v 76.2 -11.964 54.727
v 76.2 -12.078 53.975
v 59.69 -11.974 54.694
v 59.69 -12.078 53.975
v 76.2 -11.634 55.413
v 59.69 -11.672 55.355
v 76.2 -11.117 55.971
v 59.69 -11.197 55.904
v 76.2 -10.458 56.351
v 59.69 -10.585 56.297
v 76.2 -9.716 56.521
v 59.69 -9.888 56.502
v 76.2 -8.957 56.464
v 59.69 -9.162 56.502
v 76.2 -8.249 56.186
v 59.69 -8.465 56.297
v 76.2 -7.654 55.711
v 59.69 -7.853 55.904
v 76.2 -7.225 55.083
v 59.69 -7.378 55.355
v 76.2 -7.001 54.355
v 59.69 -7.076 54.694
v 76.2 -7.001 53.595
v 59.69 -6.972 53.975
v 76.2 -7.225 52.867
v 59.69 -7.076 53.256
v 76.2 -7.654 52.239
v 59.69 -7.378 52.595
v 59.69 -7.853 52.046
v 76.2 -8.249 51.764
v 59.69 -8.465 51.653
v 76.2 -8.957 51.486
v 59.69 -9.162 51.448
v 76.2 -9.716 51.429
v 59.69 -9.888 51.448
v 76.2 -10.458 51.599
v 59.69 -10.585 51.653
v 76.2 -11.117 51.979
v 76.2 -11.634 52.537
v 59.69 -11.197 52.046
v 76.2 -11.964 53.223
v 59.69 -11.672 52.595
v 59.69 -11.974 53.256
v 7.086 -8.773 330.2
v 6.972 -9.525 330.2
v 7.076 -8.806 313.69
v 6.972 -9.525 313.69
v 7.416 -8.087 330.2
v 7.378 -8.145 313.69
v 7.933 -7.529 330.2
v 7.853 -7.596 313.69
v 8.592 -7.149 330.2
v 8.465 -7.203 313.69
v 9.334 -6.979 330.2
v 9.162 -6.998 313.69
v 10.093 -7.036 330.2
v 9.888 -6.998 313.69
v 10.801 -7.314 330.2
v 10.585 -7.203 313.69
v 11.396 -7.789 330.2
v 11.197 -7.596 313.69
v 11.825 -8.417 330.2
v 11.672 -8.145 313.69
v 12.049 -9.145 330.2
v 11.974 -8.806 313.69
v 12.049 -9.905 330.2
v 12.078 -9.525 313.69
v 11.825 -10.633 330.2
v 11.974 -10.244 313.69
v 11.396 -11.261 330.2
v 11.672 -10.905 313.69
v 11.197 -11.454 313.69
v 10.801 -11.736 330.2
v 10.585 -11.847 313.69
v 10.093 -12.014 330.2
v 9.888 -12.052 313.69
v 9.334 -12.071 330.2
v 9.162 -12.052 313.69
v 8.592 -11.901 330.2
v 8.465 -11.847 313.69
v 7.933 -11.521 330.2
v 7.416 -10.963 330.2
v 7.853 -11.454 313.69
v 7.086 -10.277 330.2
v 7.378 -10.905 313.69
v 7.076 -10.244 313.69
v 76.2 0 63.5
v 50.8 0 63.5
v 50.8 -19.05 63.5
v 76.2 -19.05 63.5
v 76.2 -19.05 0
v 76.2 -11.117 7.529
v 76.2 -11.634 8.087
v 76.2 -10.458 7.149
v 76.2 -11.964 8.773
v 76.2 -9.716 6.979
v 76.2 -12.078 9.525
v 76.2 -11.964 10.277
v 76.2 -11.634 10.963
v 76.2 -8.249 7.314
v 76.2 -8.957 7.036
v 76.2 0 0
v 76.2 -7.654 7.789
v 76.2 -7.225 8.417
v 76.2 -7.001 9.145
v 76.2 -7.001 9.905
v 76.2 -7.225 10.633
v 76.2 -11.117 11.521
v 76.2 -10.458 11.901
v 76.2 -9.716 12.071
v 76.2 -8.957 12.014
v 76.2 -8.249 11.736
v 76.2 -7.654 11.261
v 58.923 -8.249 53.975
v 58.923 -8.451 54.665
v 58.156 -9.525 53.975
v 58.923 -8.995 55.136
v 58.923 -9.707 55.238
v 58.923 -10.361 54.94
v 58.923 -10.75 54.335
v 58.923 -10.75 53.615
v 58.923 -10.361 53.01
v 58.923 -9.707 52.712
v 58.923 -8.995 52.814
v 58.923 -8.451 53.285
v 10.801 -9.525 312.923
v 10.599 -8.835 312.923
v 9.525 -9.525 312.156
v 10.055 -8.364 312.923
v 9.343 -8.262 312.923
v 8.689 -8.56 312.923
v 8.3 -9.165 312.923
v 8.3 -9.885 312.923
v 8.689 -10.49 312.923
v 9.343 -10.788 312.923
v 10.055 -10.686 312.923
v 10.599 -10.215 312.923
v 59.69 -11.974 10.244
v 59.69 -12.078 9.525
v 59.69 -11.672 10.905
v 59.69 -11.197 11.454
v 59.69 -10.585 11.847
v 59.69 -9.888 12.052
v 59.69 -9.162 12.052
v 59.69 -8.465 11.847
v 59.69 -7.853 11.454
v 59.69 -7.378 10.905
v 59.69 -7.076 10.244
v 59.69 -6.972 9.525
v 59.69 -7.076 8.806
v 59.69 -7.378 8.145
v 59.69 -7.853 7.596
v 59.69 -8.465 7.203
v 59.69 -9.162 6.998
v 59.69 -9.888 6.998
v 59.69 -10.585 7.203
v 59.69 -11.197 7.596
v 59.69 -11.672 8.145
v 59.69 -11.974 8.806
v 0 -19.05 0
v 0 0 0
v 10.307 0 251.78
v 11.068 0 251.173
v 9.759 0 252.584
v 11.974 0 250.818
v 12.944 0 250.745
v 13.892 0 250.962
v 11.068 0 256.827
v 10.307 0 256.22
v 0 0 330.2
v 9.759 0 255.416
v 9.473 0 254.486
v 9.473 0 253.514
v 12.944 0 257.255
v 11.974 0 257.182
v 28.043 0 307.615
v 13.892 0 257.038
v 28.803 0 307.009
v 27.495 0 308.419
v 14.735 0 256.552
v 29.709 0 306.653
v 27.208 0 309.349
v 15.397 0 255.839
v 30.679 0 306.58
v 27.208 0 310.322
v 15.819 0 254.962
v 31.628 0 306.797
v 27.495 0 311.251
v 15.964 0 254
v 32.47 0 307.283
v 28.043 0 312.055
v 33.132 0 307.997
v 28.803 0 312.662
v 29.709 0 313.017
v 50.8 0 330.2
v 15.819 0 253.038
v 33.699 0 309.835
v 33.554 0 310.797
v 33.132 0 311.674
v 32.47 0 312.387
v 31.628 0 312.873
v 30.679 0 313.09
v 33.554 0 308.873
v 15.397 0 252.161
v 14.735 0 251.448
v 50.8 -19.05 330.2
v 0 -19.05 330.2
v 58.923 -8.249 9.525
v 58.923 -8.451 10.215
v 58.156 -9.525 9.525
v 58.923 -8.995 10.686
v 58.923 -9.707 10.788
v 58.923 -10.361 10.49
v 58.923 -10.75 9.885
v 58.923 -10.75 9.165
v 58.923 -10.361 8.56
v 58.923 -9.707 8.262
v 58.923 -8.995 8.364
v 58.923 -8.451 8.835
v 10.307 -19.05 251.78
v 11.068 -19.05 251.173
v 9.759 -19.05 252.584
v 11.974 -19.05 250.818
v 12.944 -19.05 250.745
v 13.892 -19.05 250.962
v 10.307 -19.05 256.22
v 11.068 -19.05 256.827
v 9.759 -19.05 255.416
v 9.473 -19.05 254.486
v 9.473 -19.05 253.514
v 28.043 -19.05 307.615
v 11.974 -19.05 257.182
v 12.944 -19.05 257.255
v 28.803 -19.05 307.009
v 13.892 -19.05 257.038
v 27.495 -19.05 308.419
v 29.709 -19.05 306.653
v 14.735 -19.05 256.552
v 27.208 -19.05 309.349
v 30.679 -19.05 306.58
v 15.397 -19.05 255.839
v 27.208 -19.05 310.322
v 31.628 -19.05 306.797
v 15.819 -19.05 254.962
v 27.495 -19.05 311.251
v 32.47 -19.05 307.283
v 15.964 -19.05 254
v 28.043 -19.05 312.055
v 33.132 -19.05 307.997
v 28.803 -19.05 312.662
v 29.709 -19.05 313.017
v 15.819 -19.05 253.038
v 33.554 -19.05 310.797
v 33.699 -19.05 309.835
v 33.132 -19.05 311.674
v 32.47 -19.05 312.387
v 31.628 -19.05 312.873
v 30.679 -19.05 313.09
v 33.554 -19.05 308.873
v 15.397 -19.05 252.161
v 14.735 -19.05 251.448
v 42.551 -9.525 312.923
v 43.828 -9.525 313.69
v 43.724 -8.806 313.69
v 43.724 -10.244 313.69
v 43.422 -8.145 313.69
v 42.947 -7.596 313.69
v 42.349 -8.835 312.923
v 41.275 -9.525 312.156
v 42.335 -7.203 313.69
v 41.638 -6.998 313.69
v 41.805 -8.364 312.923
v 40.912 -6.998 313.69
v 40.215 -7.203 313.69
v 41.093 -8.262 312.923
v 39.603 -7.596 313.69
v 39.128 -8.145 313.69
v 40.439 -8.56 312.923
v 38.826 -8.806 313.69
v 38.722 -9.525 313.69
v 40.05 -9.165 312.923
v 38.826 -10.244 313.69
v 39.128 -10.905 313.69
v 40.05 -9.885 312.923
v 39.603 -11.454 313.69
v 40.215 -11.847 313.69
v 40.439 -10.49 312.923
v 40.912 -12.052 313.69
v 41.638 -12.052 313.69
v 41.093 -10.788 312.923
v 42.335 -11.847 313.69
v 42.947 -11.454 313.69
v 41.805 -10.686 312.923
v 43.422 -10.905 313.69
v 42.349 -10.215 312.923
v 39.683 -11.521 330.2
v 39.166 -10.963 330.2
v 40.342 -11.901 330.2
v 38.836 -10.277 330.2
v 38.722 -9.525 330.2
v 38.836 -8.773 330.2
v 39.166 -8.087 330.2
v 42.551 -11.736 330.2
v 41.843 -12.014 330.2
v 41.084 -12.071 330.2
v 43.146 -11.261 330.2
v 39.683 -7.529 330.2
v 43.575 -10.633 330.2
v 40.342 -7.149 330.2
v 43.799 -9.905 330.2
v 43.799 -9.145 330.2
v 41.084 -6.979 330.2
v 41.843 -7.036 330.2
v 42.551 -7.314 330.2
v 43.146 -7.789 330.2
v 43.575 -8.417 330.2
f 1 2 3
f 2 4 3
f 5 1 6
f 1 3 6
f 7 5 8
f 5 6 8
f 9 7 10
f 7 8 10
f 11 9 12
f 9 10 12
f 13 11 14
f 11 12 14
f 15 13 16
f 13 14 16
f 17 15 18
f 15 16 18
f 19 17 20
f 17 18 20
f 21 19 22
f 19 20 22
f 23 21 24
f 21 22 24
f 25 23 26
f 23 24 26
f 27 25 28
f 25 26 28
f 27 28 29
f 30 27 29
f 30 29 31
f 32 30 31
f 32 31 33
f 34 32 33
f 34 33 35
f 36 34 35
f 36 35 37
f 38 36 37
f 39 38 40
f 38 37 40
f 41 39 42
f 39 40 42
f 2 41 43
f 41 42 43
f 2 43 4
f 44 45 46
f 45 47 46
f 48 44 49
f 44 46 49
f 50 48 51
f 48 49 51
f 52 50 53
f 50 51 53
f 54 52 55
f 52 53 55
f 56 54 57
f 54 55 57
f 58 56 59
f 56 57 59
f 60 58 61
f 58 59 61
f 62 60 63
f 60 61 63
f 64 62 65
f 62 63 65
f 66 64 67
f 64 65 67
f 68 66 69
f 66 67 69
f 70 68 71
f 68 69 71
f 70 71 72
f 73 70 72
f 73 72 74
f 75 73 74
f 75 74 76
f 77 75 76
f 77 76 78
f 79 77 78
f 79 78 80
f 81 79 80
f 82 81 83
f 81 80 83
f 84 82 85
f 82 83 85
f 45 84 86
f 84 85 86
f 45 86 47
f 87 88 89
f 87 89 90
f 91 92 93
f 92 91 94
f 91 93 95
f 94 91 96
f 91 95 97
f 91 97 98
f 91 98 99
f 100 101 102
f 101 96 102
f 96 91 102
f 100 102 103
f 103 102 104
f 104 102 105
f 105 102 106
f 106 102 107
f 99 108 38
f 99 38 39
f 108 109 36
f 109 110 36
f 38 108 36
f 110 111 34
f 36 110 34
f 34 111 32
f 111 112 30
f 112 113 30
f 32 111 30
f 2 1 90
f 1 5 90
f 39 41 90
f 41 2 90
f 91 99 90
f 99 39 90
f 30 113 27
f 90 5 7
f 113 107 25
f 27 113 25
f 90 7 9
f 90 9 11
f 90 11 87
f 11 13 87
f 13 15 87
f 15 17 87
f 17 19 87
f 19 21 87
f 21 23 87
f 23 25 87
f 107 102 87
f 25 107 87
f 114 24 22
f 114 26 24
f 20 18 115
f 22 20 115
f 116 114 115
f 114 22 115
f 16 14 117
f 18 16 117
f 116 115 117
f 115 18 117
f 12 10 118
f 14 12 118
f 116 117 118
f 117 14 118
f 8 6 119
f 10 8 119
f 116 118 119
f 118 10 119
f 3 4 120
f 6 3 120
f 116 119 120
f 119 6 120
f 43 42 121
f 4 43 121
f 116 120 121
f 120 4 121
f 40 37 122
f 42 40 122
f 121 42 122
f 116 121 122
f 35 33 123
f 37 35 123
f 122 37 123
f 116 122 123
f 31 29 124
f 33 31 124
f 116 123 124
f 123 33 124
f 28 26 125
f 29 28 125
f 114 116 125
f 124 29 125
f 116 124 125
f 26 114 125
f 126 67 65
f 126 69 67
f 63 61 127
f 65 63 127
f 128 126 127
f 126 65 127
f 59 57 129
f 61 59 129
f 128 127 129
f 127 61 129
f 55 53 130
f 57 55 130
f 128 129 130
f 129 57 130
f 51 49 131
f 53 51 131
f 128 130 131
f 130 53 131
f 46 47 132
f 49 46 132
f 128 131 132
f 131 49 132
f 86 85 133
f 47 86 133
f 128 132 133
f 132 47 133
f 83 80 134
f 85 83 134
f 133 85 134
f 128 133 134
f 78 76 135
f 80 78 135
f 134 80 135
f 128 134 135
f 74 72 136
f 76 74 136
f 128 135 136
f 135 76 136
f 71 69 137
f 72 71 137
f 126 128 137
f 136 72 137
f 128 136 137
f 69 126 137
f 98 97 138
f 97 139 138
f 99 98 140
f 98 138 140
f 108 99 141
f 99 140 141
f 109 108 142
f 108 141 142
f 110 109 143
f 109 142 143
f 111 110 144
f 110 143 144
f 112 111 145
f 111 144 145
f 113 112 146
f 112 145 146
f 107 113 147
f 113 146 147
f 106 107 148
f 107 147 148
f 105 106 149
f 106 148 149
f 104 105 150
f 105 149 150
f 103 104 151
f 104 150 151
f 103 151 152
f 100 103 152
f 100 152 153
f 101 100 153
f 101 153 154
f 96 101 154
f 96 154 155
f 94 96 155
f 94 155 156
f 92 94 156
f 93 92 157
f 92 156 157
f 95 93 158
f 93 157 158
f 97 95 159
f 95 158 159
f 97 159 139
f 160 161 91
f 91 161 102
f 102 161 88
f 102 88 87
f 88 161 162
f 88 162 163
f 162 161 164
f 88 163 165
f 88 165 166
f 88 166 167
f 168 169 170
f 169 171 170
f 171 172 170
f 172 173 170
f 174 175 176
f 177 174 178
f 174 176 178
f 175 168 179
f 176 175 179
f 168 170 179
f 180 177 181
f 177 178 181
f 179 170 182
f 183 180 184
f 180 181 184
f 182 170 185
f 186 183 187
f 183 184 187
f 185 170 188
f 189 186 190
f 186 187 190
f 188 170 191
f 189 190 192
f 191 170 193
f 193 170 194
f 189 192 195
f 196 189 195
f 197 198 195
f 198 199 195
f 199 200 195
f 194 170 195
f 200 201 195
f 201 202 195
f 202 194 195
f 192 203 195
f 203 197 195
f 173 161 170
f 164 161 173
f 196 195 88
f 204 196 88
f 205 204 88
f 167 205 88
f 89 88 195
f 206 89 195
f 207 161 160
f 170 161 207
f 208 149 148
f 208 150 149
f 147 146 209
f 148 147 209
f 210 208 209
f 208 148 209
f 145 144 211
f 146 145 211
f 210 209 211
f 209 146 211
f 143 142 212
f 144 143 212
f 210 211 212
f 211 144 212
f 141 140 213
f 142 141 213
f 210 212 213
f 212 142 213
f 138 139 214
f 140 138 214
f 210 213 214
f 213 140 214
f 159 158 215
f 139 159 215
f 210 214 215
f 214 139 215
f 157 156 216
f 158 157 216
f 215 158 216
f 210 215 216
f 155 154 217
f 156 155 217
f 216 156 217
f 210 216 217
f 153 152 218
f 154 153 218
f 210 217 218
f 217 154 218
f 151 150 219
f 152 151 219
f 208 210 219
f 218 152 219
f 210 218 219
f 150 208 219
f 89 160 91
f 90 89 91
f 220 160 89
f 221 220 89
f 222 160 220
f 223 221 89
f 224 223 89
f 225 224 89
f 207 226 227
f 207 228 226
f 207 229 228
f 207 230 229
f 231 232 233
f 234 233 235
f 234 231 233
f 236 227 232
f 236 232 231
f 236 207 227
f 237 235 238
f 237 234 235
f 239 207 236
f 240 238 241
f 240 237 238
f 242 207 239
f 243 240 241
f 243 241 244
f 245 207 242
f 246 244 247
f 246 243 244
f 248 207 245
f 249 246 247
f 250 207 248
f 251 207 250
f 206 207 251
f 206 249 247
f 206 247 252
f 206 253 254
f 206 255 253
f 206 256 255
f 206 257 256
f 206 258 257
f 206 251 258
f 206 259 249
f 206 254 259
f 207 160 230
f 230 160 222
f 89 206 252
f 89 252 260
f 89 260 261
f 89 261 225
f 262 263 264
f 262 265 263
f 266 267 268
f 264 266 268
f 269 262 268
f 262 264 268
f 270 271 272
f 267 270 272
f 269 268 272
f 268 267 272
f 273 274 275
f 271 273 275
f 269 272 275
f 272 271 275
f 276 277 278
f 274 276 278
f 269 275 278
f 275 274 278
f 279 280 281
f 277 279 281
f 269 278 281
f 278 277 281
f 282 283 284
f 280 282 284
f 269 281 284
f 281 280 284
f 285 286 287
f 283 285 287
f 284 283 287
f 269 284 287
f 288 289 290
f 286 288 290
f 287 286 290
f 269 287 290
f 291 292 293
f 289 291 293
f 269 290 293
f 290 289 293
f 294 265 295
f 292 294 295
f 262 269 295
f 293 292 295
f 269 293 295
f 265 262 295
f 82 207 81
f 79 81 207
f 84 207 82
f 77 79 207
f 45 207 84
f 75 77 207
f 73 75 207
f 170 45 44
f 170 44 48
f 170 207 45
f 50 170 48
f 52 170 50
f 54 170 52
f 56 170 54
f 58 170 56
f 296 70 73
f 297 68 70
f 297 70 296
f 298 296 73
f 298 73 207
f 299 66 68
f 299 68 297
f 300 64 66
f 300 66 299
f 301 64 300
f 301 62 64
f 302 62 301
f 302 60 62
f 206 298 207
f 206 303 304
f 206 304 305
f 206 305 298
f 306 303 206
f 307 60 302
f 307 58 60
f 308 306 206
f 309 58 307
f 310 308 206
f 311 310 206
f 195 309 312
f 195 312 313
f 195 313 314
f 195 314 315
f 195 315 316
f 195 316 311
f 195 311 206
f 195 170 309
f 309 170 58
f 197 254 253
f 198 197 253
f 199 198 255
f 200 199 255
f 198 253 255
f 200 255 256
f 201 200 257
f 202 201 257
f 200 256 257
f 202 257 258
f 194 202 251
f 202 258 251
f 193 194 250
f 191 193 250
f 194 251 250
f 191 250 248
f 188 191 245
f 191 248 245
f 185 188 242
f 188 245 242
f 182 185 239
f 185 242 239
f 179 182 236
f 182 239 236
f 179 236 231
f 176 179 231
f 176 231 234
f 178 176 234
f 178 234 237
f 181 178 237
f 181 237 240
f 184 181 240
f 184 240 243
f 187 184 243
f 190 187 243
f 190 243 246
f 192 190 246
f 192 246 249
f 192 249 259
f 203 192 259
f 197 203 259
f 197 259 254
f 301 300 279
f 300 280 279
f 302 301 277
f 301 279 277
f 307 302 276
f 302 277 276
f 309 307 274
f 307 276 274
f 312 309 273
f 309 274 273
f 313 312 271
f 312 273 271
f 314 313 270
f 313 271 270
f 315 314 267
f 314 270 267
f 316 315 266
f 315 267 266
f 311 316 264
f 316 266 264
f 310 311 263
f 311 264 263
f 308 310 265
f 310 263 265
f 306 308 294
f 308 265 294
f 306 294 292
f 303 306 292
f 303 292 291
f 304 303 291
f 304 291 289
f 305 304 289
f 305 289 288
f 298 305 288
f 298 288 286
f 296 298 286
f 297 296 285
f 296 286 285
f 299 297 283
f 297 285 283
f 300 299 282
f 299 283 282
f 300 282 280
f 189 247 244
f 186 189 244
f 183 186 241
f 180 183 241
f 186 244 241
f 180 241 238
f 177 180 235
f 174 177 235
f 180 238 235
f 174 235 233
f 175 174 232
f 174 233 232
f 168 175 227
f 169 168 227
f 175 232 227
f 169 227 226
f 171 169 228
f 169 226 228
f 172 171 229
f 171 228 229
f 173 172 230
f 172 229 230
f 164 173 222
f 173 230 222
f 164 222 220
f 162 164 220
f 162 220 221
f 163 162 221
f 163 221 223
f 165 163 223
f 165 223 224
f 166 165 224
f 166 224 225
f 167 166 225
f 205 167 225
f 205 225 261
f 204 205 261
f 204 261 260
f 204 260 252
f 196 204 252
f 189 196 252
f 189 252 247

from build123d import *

# Parameters (mm, degrees)
F0_W      = 76.2
F0_H      = 330.2
F1_DEPTH  = 19.05
F2_W      = 25.4
F2_H      = 266.7
F3_DEPTH  = 19.051
F4_R      = 3.2639
F5_DEPTH  = 19.051
F6_R      = 3.2639
F7_DEPTH  = 19.051
F9_D      = 5.1054
F9_DEPTH  = 16.51
F9_TIP    = 1.5338169022
F11_D     = 5.1054
F11_DEPTH = 16.51
F11_TIP   = 1.5338169022


with BuildPart() as f1:
    # F0 (on Front) → F1 (new body)
    with BuildSketch(Plane.XZ):
        with Locations((38.1, 165.1)):
            Rectangle(F0_W, F0_H)
    extrude(amount=F1_DEPTH)

    # F2 (on face) → F3 (cut, through all)
    with BuildSketch(Plane.XZ):
        with Locations((63.5, 196.85)):
            Rectangle(F2_W, F2_H)
    extrude(amount=F3_DEPTH, mode=Mode.SUBTRACT)

    # F4 (on face) → F5 (cut, through all)
    with BuildSketch(Plane.XZ.offset(19.05)):
        with Locations((12.7, 254)):
            Circle(F4_R)
    extrude(amount=-F5_DEPTH, mode=Mode.SUBTRACT)

    # F6 (on face) → F7 (cut, through all)
    with BuildSketch(Plane.XZ.offset(19.05)):
        with Locations((30.4351865955, 309.8351865955)):
            Circle(F6_R)
    extrude(amount=-F7_DEPTH, mode=Mode.SUBTRACT)

    # F9
    with Locations(Plane.XY.offset(330.2)):
        with Locations((9.525, -9.525), (41.275, -9.525)):
            Hole(F9_D / 2, depth=F9_DEPTH)
            with Locations((0, 0, -(F9_DEPTH + F9_TIP / 2))):  # 118° drill point
                Cone(0, F9_D / 2, F9_TIP, mode=Mode.SUBTRACT)

    # F11
    with Locations(Plane.YZ.offset(76.2)):
        with Locations((-9.525, 53.975), (-9.525, 9.525)):
            Hole(F11_D / 2, depth=F11_DEPTH)
            with Locations((0, 0, -(F11_DEPTH + F11_TIP / 2))):  # 118° drill point
                Cone(0, F11_D / 2, F11_TIP, mode=Mode.SUBTRACT)


solid = f1.part
